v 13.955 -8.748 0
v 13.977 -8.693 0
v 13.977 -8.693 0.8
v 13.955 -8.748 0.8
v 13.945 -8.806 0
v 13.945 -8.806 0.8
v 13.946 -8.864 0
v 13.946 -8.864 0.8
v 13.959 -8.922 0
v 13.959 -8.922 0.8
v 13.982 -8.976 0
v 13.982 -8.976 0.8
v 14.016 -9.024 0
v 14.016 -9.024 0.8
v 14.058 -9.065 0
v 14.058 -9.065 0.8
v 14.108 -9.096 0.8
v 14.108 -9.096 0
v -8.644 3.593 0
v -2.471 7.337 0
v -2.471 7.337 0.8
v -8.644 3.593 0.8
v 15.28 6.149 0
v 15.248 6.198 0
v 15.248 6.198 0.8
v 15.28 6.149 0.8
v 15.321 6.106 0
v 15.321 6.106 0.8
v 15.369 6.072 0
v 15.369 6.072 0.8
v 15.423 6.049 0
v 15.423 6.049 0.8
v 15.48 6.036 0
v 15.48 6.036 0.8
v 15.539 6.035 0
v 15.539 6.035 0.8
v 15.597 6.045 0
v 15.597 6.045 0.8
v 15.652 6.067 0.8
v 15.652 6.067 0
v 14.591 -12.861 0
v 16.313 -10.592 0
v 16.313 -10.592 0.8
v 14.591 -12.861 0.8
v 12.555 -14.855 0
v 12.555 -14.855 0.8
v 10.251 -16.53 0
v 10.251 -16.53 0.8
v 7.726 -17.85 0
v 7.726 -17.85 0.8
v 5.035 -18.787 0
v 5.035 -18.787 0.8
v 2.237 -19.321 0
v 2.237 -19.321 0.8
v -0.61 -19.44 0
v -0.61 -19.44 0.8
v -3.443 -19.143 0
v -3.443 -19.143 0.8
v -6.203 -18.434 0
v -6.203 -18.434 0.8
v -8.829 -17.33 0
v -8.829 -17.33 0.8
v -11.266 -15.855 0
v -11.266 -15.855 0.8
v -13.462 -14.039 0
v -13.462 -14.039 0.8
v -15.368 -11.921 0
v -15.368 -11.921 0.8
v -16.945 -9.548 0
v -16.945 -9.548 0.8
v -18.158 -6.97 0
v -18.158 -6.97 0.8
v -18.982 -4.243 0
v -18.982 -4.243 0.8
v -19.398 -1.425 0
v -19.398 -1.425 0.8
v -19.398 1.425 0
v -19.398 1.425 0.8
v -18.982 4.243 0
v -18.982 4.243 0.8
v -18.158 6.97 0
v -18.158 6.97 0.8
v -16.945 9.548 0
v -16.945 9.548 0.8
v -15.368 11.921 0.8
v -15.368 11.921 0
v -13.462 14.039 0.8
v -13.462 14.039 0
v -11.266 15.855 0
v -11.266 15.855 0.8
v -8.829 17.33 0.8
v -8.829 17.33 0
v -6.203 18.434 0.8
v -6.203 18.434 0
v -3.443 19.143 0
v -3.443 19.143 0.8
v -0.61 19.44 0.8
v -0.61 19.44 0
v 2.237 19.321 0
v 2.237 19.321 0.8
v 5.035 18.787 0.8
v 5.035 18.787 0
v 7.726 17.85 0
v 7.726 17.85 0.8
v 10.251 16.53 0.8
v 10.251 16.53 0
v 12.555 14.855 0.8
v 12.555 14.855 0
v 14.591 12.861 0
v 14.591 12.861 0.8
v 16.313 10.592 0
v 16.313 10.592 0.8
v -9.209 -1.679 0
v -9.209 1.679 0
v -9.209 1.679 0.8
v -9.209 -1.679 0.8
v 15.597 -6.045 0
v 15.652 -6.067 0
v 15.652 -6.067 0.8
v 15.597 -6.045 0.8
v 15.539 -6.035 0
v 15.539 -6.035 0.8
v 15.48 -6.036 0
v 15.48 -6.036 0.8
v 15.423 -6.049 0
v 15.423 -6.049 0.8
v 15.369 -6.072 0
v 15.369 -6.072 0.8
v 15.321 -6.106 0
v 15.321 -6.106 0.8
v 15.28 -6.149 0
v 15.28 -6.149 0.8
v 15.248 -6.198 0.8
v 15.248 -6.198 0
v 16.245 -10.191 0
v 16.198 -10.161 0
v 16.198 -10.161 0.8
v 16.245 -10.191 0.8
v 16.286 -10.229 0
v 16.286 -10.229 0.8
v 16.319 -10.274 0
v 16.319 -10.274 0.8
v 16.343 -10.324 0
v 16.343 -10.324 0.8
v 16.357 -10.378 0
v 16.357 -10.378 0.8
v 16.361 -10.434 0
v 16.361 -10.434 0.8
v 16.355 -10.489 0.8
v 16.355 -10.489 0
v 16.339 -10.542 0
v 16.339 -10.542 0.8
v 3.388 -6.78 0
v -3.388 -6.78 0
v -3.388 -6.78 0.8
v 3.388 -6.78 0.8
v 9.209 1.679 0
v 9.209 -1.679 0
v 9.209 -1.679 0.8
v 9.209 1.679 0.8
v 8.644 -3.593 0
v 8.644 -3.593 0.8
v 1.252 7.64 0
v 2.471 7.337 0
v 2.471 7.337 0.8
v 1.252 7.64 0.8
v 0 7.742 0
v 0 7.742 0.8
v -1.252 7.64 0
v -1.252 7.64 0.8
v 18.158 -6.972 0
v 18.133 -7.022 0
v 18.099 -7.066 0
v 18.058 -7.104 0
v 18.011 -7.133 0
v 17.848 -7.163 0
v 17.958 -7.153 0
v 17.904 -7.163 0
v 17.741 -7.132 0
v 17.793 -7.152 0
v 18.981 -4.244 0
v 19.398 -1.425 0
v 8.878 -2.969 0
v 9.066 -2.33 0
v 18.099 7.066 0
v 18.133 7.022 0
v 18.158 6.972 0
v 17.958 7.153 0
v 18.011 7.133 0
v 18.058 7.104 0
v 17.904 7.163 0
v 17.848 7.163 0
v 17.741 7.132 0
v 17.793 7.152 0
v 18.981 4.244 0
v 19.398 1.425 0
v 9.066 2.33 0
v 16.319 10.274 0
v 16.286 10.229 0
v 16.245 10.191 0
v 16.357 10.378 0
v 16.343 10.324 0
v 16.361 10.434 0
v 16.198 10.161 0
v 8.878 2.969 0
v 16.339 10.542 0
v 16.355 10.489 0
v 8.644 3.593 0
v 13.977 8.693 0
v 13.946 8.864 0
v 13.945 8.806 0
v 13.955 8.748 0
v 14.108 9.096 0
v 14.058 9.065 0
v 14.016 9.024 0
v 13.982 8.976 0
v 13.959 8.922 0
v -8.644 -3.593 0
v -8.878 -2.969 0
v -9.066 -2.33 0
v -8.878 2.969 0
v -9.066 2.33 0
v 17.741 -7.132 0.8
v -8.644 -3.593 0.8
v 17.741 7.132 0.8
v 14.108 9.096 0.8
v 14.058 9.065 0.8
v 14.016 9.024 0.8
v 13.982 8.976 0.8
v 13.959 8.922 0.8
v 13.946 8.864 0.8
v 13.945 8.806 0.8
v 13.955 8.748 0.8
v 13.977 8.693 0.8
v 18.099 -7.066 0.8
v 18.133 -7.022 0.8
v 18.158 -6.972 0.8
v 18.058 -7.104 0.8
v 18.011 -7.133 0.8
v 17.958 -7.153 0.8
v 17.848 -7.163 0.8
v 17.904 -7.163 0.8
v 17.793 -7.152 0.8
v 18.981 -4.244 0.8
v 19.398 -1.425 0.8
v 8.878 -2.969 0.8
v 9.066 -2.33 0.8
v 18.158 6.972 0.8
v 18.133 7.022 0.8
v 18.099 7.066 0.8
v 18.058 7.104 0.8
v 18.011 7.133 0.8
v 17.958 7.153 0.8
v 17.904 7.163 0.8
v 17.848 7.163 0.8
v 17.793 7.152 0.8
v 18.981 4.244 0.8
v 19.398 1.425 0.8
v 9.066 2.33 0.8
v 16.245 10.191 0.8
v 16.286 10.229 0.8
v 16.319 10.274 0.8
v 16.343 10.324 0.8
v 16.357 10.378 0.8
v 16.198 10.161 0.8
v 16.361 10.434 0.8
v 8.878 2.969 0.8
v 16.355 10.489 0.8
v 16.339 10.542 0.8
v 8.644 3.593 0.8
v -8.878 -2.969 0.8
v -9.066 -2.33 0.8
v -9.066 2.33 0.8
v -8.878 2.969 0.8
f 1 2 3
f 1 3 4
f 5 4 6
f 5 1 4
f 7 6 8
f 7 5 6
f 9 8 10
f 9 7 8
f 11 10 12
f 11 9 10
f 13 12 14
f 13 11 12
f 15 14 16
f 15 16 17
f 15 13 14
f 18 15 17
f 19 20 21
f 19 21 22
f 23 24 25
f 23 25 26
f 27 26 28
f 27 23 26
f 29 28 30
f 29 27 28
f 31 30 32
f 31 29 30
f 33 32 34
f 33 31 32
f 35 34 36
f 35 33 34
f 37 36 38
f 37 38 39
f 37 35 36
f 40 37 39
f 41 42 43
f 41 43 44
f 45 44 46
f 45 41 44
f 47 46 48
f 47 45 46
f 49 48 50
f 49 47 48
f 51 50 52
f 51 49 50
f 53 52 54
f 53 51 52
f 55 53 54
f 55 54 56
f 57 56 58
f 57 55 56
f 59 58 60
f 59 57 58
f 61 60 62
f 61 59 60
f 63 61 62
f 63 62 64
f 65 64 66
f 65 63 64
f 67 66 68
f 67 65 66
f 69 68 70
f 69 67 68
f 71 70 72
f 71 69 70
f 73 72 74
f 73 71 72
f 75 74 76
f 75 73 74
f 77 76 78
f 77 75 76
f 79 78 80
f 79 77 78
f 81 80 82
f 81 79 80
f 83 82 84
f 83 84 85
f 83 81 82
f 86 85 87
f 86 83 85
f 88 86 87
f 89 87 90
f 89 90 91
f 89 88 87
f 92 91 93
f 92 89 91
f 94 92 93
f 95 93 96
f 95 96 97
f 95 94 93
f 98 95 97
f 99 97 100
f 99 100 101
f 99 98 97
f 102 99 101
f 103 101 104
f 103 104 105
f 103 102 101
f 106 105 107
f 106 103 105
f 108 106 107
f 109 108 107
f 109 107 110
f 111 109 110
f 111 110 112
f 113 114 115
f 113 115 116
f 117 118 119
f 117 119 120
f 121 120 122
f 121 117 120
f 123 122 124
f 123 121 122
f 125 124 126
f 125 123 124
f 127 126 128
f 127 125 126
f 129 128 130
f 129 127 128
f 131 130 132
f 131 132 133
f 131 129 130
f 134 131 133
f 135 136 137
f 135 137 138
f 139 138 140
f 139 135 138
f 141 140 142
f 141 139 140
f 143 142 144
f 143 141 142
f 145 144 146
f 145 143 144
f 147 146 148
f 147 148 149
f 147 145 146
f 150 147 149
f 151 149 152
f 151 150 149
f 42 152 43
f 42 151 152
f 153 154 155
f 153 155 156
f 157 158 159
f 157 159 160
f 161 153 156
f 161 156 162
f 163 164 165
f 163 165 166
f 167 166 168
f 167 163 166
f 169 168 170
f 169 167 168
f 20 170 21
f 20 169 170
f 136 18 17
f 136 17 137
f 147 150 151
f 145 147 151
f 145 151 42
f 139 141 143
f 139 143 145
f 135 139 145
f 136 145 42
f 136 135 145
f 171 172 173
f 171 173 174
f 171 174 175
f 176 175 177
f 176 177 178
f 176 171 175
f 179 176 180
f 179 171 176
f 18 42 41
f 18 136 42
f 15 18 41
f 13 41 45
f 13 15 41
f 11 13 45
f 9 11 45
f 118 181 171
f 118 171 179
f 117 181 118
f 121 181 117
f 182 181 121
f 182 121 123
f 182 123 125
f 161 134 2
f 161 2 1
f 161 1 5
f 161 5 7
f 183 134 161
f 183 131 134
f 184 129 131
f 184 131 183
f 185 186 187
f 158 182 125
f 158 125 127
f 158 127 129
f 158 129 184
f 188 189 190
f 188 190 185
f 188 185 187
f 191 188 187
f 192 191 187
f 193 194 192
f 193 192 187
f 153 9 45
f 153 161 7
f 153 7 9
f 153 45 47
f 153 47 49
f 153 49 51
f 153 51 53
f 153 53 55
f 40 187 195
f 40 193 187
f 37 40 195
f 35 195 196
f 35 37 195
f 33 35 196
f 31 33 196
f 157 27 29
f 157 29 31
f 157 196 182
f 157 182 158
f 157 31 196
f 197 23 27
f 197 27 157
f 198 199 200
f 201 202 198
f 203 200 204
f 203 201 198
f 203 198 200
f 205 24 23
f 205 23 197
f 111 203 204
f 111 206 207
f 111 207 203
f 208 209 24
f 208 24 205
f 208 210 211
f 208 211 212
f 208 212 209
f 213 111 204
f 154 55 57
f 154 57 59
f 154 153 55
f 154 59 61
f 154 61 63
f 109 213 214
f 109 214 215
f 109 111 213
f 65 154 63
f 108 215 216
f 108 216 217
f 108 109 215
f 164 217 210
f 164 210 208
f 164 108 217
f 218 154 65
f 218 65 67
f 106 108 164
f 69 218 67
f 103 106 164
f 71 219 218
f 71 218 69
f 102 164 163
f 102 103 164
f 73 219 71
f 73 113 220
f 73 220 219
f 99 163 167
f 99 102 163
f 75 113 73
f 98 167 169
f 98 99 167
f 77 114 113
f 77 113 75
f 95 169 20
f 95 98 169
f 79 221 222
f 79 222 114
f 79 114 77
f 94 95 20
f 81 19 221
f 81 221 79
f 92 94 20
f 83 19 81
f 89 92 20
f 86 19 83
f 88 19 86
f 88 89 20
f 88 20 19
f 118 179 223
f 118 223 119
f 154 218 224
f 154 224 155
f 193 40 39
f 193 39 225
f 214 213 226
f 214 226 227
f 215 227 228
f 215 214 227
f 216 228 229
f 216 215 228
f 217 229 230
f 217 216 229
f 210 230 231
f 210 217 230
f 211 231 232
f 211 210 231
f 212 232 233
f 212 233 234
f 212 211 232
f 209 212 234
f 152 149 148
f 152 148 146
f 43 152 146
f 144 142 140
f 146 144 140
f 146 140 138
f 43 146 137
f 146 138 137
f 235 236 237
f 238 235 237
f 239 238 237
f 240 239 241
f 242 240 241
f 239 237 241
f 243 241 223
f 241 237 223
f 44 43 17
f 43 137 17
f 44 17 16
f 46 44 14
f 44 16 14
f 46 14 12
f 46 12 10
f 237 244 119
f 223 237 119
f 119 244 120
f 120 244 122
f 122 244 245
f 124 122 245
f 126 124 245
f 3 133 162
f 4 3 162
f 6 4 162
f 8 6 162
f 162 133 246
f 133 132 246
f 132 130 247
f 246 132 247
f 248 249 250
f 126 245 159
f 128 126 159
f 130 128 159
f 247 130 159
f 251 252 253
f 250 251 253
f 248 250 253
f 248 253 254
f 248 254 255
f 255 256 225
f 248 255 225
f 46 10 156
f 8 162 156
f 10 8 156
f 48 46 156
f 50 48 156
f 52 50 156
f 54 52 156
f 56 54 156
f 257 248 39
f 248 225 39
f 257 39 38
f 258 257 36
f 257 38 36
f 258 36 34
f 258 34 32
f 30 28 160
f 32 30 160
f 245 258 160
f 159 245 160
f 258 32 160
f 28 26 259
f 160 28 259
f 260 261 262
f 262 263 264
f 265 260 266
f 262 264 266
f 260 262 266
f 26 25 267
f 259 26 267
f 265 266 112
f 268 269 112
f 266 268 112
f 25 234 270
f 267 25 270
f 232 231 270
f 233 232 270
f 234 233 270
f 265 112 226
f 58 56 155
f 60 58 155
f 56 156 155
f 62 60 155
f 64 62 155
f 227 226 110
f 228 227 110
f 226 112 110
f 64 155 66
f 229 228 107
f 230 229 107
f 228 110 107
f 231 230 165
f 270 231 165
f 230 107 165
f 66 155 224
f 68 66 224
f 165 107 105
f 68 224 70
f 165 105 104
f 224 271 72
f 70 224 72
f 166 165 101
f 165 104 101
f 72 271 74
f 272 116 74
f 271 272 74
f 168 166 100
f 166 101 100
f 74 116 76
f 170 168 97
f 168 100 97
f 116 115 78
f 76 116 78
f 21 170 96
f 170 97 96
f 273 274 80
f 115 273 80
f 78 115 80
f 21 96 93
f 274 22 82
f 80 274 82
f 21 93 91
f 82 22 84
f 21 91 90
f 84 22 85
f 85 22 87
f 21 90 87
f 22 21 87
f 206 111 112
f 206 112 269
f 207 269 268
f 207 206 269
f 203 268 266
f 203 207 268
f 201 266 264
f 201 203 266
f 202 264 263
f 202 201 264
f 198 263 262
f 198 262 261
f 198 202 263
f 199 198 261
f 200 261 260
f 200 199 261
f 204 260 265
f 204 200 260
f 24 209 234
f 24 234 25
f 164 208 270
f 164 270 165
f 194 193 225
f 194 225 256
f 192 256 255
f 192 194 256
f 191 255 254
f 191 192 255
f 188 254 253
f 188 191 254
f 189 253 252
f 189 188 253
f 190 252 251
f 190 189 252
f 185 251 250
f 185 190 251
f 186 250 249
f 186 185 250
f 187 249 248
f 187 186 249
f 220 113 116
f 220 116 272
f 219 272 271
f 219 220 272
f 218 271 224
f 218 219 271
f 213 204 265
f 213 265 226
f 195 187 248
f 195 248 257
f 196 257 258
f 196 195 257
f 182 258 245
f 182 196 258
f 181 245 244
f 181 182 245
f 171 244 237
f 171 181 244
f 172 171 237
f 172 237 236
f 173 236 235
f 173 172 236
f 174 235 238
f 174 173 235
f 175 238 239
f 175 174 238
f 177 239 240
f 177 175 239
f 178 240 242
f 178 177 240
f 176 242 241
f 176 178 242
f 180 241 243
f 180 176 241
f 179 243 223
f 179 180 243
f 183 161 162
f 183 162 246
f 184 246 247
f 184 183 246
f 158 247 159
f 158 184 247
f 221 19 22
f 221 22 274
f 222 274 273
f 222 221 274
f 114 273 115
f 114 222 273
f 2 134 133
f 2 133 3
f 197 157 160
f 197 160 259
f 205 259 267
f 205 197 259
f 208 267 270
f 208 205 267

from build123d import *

# Parameters (mm, degrees)
BOSS_EXTRU_1_DEPTH = 0.8
EMPREINTE1_DEPTH   = 0.8


# Read off the part's stored shape, not the designer's step: Empreinte1
with BuildPart() as part:
    # Esquisse1 → Boss.-Extru.1 (new body)
    with BuildSketch(Plane.XY):
        with BuildLine():
            Line((13.976920297, 8.69285333), (15.248093696, 6.198035062))
            ThreePointArc((15.248093696, 6.198035062), (15.422690555, 6.048915257), (15.651592804, 6.066930255))
            Line((15.651592804, 6.066930255), (17.741248134, 7.131662826))
            ThreePointArc((17.741248134, 7.131662826), (17.984943021, 7.144439851), (18.1575097, 6.971896548))
            ThreePointArc((18.1575097, 6.971896548), (19.45, 0), (18.1575097, -6.971896548))
            ThreePointArc((18.1575097, -6.971896548), (17.984943021, -7.144439851), (17.741248134, -7.131662826))
            Line((17.741248134, -7.131662826), (15.651592804, -6.066930255))
            ThreePointArc((15.651592804, -6.066930255), (15.422690555, -6.048915257), (15.248093696, -6.198035062))
            Line((15.248093696, -6.198035062), (13.976920297, -8.69285333))
            ThreePointArc((13.976920297, -8.69285333), (13.958905299, -8.921755578), (14.108025104, -9.096352437))
            Line((14.108025104, -9.096352437), (16.197680434, -10.161085008))
            ThreePointArc((16.197680434, -10.161085008), (16.351257526, -10.350728166), (16.313099211, -10.591755952))
            ThreePointArc((16.313099211, -10.591755952), (-19.45, 0), (16.313099211, 10.591755952))
            ThreePointArc((16.313099211, 10.591755952), (16.351257526, 10.350728166), (16.197680434, 10.161085008))
            Line((16.197680434, 10.161085008), (14.108025104, 9.096352437))
            ThreePointArc((14.108025104, 9.096352437), (13.958905299, 8.921755578), (13.976920297, 8.69285333))
        make_face()
    extrude(amount=BOSS_EXTRU_1_DEPTH)

    # Empreinte1 outline → Empreinte1 (cut)
    with BuildSketch(Plane.XY):
        with BuildLine():
            ThreePointArc((9.2092, 1.678974794), (8.977813151, 2.650885141), (8.644162553, 3.5926))
            Line((8.644162553, 3.5926), (2.470606857, 7.337))
            ThreePointArc((2.470606857, 7.337), (0, 7.7418), (-2.470606857, 7.337))
            Line((-2.470606857, 7.337), (-8.644162553, 3.5926))
            ThreePointArc((-8.644162553, 3.5926), (-8.977813151, 2.650885141), (-9.2092, 1.678974794))
            Line((-9.2092, 1.678974794), (-9.2092, -1.678974794))
            ThreePointArc((-9.2092, -1.678974794), (-8.977813151, -2.650885141), (-8.644162553, -3.5926))
            Line((-8.644162553, -3.5926), (-3.388297568, -6.7804))
            Line((-3.388297568, -6.7804), (3.388297568, -6.7804))
            Line((3.388297568, -6.7804), (8.644162553, -3.5926))
            ThreePointArc((8.644162553, -3.5926), (8.977813151, -2.650885141), (9.2092, -1.678974794))
            Line((9.2092, -1.678974794), (9.2092, 1.678974794))
        make_face()
    extrude(amount=EMPREINTE1_DEPTH, mode=Mode.SUBTRACT)


solid = part.part
